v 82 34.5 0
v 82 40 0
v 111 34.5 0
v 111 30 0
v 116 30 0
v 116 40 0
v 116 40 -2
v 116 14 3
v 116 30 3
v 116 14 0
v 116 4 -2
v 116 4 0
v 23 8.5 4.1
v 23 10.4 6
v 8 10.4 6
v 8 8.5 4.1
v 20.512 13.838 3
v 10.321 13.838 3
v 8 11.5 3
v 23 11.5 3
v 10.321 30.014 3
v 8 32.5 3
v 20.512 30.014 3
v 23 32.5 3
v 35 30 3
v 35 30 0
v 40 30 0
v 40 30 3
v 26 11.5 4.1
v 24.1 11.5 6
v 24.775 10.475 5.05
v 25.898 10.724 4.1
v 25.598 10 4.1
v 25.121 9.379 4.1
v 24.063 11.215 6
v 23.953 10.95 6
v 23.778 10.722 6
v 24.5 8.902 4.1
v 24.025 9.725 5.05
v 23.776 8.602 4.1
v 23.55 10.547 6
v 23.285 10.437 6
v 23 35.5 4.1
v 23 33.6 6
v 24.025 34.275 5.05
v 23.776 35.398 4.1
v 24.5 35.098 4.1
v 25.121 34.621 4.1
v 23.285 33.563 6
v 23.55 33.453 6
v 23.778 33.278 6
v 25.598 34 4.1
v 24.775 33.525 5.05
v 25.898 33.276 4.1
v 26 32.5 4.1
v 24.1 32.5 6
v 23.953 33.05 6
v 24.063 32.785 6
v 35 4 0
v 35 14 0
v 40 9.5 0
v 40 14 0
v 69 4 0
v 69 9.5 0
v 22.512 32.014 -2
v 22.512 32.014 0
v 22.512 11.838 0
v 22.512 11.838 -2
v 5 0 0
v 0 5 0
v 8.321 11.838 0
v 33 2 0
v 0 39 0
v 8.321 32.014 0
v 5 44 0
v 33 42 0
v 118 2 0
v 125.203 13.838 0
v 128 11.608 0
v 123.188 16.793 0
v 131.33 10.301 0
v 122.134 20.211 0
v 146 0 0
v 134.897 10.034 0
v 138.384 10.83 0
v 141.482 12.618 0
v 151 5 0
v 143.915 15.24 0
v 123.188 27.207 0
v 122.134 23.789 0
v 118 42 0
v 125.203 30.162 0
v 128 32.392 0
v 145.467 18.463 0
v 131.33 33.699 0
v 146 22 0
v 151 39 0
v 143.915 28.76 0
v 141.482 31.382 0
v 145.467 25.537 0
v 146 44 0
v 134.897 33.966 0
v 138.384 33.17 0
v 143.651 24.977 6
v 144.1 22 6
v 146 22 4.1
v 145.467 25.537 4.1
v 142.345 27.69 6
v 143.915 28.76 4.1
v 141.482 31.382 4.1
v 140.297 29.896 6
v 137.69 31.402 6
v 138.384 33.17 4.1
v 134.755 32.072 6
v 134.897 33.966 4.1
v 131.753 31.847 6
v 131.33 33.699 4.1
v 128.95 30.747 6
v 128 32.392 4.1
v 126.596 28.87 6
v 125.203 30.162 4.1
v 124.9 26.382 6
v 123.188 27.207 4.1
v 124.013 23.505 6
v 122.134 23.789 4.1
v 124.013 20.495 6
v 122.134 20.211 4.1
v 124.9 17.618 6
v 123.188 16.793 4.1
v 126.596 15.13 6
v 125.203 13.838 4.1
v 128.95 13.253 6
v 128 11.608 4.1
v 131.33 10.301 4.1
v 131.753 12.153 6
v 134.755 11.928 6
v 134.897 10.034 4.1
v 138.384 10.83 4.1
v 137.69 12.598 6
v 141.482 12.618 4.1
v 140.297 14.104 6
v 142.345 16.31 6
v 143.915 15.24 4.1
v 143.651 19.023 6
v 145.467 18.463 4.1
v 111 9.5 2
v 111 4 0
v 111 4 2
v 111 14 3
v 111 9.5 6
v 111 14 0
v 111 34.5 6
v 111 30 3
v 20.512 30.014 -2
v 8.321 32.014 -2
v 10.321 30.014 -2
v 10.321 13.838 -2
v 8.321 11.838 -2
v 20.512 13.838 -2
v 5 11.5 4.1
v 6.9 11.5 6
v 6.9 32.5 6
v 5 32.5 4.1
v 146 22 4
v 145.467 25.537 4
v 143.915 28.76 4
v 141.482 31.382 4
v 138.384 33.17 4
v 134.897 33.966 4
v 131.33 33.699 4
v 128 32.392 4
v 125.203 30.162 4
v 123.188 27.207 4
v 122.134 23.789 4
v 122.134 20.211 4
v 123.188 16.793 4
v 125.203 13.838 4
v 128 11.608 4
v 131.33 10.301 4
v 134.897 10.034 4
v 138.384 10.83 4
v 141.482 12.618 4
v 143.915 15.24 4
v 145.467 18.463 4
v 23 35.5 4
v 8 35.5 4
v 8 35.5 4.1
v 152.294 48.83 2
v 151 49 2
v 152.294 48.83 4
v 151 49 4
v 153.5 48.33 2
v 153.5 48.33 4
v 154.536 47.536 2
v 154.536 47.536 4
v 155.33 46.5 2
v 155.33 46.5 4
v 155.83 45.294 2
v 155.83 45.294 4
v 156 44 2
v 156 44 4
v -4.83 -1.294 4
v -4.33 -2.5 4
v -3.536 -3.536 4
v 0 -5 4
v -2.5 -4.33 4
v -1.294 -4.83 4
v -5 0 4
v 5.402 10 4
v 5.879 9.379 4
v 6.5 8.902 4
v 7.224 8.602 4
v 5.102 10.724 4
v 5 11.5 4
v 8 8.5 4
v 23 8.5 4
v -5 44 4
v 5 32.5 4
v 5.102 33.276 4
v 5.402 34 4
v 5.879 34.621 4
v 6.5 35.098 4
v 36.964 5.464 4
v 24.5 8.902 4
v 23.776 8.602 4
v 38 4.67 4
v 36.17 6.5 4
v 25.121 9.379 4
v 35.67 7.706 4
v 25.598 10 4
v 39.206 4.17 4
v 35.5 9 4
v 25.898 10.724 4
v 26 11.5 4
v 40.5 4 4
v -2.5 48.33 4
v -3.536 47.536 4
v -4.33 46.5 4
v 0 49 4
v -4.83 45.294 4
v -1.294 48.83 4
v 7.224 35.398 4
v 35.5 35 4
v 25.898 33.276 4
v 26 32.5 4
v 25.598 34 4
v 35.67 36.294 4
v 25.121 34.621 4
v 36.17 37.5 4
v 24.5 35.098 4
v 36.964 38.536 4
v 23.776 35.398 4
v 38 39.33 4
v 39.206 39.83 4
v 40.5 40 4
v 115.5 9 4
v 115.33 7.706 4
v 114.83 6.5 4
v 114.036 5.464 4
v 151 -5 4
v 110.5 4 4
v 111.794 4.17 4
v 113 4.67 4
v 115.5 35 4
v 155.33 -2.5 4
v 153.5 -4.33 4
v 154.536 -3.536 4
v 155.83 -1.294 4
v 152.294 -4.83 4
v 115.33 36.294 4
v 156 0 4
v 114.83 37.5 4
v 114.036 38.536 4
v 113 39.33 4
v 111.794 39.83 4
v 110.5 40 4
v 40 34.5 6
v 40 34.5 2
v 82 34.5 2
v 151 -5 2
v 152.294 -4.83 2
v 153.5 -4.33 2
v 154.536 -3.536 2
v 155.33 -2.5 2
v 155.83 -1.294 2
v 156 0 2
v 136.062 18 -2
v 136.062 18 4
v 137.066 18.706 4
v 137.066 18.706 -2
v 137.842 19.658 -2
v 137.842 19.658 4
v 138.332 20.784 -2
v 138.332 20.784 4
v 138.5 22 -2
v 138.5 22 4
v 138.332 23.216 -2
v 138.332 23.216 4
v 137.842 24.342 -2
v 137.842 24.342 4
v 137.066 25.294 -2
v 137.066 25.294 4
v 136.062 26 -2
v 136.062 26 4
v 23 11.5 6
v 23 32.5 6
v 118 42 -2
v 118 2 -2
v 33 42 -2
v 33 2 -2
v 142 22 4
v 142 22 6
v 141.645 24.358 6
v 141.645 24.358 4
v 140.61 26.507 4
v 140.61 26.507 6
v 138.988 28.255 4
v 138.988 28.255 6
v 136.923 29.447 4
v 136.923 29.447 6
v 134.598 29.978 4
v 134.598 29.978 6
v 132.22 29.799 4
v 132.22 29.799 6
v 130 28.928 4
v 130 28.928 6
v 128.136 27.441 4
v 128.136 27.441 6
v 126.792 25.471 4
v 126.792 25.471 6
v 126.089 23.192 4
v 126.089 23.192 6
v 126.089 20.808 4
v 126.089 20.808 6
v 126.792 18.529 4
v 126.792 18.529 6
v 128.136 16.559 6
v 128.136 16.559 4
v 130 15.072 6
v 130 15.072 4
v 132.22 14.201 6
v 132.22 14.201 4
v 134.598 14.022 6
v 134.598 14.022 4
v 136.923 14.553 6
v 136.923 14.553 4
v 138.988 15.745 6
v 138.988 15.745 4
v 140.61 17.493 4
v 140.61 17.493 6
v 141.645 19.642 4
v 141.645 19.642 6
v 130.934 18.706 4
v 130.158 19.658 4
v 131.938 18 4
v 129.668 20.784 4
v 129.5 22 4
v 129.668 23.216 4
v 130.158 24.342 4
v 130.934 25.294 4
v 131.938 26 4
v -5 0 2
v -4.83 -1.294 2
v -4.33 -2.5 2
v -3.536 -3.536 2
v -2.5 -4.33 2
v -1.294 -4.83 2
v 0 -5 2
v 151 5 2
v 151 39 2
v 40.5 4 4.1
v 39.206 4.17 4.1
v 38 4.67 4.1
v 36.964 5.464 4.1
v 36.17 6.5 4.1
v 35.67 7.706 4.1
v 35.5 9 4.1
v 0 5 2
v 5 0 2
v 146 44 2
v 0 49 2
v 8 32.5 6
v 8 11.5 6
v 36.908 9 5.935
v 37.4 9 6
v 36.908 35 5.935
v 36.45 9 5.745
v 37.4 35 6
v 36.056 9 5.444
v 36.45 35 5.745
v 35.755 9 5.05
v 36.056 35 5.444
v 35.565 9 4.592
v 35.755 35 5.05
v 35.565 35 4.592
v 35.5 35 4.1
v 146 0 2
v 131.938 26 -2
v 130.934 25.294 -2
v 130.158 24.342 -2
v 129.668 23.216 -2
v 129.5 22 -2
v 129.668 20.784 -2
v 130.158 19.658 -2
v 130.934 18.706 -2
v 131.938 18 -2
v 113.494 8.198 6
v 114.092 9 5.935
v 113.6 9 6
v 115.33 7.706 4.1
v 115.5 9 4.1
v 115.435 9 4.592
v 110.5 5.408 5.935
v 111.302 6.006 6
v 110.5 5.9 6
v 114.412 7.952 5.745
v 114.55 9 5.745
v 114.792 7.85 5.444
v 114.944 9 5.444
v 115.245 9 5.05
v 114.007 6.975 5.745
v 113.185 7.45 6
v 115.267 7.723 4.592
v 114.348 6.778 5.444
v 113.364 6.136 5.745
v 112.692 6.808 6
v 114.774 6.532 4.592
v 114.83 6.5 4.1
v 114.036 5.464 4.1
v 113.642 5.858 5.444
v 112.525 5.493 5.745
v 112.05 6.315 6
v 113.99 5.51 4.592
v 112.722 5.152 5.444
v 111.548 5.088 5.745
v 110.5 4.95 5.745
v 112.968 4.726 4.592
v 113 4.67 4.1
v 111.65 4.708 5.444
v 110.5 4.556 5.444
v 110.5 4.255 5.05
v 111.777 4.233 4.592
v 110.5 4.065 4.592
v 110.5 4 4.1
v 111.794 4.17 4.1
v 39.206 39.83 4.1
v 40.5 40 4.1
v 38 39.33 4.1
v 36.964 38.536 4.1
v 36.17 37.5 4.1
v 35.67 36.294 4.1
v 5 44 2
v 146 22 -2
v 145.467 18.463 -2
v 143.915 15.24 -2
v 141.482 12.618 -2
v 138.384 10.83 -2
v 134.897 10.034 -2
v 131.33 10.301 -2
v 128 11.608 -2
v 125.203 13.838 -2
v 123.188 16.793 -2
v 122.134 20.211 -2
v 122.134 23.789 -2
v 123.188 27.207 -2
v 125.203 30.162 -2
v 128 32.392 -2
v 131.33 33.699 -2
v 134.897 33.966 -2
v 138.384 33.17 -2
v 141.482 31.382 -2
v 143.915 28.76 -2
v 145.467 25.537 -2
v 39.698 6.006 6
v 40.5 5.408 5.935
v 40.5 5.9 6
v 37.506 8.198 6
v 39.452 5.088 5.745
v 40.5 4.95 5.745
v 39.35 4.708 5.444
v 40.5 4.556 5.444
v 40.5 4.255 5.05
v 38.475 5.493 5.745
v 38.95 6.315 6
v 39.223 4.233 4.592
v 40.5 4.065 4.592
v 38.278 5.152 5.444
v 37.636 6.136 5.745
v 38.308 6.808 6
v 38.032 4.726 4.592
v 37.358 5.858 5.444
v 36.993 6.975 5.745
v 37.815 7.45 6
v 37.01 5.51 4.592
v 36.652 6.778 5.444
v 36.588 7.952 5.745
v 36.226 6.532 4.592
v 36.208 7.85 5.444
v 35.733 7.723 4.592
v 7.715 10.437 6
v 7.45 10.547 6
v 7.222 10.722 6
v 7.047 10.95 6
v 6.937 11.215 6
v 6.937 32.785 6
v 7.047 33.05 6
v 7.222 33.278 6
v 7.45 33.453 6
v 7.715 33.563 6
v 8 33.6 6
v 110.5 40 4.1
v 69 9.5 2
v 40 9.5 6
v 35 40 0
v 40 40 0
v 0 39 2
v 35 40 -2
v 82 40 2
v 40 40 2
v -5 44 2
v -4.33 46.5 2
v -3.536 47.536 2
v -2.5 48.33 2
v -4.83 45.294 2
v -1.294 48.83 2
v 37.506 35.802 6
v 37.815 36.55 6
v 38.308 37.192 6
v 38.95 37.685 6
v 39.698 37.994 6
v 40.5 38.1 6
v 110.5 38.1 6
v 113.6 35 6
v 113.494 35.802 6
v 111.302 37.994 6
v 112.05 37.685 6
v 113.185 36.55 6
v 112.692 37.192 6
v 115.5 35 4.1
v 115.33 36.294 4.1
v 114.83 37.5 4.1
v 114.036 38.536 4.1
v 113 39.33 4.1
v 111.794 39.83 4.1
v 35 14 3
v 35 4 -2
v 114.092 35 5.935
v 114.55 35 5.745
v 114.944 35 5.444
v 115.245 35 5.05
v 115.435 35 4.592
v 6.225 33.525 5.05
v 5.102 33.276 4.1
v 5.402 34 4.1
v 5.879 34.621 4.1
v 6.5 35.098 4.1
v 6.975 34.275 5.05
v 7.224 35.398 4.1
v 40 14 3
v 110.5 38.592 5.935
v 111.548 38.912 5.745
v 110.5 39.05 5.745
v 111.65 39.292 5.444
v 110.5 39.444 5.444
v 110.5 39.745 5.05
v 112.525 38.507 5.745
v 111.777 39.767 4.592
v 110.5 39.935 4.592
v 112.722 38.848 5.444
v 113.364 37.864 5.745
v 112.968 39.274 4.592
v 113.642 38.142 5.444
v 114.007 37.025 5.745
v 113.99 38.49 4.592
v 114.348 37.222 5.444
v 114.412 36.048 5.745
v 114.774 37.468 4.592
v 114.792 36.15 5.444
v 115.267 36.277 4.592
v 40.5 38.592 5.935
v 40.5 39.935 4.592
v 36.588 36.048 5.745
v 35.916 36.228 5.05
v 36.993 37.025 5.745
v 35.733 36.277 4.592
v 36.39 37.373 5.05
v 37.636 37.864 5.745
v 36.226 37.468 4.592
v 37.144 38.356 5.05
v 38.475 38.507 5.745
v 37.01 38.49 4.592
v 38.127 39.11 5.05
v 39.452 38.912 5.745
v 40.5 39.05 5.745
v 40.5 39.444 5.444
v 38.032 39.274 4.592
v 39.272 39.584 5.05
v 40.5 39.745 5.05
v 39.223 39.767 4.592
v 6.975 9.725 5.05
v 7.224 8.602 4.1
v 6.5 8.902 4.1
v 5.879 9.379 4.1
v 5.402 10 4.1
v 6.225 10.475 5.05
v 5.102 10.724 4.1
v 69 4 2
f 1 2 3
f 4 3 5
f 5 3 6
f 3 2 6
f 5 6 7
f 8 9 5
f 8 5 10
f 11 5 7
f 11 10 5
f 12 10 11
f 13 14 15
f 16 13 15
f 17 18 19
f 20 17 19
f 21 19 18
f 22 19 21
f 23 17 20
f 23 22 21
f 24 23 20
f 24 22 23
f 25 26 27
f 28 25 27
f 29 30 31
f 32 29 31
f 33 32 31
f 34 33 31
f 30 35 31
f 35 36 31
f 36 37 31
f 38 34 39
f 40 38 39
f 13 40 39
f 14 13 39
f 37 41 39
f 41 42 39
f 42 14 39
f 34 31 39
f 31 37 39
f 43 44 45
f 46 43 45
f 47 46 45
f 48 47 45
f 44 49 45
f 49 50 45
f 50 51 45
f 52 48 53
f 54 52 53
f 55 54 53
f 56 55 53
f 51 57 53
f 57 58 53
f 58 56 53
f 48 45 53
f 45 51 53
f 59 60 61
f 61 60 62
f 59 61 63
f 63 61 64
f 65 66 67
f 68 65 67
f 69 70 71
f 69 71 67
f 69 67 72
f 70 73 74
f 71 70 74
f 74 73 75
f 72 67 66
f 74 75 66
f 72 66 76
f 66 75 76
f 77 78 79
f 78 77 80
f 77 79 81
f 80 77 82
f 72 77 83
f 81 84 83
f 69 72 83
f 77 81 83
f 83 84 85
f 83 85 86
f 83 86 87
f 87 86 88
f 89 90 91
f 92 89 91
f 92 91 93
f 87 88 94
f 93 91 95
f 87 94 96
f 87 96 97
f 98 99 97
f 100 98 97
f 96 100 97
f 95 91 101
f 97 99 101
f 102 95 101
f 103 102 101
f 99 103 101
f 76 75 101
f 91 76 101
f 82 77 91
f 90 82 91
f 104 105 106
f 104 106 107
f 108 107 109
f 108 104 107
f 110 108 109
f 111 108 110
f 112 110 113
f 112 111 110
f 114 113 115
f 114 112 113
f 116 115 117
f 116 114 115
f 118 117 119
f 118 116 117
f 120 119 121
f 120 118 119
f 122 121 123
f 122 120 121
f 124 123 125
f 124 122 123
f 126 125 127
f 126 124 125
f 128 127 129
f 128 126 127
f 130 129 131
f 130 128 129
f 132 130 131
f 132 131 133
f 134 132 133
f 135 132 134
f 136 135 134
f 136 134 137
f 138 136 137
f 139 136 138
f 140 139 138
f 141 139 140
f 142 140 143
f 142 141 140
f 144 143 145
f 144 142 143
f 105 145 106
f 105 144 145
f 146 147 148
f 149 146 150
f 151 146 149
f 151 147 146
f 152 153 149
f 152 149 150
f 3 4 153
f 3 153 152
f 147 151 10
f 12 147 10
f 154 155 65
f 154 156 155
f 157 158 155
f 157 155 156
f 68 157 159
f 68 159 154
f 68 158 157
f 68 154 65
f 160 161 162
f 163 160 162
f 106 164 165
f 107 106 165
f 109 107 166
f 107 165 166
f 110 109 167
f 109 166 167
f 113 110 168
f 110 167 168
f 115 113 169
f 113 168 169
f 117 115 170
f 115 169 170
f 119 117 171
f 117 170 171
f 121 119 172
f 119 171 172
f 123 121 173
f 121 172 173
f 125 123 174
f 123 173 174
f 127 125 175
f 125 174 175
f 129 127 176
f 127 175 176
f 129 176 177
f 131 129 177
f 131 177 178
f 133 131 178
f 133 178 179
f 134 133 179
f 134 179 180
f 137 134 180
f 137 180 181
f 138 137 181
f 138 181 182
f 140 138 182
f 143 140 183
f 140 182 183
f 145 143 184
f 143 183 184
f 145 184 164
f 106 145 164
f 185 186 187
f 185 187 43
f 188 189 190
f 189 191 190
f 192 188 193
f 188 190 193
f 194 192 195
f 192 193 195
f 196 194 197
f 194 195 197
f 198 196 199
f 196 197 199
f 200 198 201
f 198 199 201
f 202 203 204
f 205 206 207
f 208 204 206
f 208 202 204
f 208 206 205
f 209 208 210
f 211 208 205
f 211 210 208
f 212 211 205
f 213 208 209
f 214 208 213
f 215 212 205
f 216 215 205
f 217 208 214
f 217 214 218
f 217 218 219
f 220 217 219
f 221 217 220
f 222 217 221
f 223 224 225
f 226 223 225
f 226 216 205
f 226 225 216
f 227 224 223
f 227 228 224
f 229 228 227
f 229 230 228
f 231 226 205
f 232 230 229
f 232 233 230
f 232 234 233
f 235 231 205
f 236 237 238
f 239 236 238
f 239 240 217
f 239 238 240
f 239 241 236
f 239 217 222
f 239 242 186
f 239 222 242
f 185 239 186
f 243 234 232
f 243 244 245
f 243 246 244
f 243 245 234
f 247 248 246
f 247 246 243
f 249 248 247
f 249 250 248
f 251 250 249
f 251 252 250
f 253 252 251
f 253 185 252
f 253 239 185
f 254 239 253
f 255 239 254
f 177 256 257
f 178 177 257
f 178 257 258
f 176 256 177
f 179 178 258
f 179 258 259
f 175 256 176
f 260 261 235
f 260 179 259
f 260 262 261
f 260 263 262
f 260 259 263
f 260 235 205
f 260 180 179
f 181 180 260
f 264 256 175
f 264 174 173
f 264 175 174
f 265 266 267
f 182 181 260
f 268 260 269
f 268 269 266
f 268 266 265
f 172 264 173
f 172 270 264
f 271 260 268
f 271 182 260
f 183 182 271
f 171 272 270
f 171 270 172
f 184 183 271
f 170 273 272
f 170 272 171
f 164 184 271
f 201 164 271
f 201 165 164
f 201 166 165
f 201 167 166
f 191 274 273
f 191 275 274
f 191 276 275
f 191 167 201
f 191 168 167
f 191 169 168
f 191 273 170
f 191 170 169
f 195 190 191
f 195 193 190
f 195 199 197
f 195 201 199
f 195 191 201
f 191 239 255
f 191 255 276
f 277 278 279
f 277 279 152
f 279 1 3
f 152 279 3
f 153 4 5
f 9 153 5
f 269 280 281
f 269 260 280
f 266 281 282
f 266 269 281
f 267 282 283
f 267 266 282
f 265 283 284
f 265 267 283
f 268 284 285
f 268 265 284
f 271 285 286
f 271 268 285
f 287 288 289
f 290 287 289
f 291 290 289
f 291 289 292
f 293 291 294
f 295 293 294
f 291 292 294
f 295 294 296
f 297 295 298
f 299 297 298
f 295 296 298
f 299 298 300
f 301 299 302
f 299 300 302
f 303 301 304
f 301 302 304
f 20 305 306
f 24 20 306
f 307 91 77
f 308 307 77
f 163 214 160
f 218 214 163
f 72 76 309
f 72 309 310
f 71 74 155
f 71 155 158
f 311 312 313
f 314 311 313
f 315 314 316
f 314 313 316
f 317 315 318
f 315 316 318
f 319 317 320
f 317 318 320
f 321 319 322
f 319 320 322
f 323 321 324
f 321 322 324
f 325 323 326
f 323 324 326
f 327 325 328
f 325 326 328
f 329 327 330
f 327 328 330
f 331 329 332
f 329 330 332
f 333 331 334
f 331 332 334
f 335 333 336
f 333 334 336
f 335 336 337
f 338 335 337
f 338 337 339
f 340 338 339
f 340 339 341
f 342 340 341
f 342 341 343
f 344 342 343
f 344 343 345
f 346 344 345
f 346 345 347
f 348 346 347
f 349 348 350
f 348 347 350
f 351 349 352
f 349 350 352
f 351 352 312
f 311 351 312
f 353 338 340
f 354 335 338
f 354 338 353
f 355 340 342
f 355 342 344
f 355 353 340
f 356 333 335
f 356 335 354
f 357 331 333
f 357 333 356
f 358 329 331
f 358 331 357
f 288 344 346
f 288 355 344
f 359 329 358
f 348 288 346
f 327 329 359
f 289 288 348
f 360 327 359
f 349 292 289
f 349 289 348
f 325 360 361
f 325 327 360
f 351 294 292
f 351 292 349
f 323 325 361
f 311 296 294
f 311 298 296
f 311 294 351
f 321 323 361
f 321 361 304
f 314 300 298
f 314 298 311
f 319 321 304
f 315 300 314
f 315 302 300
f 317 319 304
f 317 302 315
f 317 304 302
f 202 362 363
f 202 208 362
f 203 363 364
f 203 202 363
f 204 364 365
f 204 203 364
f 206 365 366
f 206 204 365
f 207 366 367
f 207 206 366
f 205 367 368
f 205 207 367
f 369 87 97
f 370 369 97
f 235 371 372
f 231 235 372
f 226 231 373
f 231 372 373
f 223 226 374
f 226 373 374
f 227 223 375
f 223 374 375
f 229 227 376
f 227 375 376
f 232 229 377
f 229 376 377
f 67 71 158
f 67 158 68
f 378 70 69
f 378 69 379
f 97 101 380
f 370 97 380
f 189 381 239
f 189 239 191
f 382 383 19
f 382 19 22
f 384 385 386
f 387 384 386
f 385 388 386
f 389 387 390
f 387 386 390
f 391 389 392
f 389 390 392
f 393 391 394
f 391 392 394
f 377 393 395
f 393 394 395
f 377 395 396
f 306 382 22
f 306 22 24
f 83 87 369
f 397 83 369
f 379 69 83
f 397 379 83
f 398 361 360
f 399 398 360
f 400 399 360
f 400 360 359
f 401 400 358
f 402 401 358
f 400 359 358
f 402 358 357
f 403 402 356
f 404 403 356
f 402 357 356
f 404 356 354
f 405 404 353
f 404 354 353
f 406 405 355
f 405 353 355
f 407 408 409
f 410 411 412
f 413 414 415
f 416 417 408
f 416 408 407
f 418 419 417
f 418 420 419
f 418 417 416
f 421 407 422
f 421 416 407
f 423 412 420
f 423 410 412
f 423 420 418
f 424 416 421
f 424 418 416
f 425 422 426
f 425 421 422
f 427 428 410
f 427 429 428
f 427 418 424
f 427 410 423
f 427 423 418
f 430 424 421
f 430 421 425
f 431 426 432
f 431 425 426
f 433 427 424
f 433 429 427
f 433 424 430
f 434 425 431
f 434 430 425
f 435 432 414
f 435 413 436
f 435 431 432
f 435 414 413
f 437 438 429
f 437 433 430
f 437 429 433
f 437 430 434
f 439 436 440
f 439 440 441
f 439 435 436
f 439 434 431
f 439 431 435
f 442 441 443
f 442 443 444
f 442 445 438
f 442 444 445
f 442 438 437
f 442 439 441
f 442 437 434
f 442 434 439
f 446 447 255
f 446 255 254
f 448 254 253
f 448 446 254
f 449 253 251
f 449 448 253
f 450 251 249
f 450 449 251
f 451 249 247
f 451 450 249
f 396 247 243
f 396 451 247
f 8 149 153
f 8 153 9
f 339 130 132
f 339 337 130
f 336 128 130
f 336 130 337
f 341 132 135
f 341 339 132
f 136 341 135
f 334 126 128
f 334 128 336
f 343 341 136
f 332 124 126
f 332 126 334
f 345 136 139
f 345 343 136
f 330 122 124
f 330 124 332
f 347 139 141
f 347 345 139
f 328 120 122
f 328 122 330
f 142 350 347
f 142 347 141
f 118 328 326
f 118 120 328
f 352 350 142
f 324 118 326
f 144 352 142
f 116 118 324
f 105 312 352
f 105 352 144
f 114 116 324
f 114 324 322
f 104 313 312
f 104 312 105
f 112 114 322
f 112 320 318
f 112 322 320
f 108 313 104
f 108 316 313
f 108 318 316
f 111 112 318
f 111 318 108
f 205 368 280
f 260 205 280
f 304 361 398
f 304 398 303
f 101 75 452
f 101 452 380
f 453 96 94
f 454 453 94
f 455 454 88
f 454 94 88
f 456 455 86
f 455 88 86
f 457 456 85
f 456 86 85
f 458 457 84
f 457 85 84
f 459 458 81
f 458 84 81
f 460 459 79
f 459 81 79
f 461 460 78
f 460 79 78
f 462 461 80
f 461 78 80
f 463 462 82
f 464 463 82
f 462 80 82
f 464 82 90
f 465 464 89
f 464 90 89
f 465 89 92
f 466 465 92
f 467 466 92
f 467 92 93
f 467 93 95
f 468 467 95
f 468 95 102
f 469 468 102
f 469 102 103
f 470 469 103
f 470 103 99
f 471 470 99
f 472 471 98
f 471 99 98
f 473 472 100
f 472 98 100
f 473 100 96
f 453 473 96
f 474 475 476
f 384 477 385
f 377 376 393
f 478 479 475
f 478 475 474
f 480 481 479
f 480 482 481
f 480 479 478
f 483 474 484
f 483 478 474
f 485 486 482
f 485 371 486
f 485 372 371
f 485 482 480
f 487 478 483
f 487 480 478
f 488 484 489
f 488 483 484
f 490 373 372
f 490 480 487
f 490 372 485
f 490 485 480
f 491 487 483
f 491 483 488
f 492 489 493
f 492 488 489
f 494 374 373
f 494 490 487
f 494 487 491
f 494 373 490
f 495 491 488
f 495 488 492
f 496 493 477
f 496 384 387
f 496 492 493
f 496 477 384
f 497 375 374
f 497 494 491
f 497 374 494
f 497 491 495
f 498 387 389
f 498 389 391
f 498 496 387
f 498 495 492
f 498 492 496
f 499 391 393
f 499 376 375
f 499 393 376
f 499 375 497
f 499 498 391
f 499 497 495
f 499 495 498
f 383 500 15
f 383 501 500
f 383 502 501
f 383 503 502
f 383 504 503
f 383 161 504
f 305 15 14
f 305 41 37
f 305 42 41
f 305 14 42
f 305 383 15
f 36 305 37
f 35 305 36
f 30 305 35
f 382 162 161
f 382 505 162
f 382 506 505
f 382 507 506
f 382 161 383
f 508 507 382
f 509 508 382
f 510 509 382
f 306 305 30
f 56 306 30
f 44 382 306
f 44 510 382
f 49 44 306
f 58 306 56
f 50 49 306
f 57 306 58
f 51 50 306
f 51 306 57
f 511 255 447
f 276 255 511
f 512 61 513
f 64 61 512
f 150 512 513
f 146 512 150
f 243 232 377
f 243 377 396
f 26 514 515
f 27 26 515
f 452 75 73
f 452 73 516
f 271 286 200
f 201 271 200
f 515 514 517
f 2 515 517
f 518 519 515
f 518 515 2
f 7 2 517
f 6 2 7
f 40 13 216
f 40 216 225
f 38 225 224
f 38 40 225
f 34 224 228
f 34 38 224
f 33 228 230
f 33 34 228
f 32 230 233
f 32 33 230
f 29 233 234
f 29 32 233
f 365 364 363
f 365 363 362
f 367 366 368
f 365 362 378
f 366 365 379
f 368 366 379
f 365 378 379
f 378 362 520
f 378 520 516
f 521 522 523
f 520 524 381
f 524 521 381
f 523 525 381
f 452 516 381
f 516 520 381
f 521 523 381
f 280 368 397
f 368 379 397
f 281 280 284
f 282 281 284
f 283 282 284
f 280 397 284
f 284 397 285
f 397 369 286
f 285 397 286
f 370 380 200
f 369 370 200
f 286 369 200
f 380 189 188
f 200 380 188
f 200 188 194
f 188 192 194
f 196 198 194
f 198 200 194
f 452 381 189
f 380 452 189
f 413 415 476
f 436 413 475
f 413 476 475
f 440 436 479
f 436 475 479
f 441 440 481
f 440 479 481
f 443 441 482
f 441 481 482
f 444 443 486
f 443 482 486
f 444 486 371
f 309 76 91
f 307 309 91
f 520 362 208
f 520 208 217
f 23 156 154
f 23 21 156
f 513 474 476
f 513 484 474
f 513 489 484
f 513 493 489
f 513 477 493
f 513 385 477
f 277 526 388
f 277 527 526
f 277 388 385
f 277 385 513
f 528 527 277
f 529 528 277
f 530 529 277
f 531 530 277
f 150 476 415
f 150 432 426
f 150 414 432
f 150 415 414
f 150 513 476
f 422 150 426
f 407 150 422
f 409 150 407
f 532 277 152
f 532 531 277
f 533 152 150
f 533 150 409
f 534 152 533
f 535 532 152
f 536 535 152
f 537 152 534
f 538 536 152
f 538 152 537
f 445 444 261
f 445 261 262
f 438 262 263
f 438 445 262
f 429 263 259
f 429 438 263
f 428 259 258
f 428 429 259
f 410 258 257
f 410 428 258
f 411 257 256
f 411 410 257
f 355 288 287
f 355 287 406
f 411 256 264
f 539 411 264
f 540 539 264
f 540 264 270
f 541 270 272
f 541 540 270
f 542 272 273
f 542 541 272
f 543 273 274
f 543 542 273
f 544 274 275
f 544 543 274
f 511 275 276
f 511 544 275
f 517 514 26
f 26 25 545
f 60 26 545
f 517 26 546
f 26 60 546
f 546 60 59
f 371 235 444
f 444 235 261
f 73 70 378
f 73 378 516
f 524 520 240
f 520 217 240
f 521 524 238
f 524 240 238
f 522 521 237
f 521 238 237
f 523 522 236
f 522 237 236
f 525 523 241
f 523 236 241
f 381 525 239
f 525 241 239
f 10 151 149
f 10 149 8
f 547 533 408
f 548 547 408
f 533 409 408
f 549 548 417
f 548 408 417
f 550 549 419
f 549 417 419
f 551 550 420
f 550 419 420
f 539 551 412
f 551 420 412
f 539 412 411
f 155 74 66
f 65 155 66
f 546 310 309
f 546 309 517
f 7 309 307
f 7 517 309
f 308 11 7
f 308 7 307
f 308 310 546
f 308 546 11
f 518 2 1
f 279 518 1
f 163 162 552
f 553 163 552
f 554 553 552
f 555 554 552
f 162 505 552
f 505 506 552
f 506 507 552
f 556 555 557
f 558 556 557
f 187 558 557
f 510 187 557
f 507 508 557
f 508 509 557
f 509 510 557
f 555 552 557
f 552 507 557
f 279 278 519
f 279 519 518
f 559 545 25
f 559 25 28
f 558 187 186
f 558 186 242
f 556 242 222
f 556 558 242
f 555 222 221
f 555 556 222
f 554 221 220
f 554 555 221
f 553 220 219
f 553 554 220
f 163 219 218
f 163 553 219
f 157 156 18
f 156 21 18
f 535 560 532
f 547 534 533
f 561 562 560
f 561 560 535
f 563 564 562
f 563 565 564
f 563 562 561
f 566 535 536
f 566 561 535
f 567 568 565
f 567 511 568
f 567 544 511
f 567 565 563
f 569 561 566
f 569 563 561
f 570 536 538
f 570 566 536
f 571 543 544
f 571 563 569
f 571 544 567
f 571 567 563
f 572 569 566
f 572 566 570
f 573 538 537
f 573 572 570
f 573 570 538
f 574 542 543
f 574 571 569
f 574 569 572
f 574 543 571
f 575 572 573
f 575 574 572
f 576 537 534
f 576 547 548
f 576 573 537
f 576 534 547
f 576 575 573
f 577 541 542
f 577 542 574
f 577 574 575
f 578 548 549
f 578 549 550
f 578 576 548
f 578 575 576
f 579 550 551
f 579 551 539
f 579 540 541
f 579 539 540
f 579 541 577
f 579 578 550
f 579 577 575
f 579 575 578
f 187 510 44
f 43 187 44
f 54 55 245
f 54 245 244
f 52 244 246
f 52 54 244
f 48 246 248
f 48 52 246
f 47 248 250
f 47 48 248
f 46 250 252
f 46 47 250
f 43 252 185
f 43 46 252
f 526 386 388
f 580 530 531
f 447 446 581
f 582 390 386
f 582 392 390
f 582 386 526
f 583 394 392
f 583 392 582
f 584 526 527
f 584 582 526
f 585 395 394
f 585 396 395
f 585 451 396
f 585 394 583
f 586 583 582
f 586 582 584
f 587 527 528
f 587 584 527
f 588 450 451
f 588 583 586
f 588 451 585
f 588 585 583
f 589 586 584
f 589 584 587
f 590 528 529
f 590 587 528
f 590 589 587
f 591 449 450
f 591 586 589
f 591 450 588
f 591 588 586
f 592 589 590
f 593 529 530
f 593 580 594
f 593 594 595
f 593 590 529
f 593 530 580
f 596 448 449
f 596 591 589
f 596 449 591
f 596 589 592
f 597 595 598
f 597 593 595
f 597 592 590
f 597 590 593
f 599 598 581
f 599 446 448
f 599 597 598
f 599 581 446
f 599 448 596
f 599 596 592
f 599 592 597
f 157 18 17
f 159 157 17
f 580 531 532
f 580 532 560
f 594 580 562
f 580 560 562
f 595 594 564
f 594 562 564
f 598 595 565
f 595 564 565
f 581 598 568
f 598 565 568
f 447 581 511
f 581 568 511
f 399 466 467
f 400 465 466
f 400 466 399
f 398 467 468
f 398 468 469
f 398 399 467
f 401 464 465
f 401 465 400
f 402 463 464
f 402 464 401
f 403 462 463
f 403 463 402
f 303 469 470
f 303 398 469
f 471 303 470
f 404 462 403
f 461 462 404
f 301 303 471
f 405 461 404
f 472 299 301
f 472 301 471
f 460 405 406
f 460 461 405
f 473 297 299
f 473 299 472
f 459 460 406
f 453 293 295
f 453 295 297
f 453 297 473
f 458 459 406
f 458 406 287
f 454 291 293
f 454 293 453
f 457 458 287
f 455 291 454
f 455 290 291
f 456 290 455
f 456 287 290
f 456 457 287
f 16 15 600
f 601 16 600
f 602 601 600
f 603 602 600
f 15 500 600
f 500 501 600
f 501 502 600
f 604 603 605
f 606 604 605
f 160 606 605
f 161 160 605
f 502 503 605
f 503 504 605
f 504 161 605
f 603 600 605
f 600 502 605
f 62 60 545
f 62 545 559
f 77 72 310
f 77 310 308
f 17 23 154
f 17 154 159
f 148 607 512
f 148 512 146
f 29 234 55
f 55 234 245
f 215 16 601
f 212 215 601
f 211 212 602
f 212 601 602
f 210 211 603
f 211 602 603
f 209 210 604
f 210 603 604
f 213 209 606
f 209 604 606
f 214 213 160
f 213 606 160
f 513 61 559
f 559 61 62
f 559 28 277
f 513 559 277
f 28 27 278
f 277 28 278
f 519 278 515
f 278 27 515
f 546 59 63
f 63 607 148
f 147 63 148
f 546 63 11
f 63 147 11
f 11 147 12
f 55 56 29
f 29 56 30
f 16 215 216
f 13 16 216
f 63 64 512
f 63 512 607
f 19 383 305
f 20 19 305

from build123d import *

# Parameters (mm, degrees)
SKETCH_W        = 151
SKETCH_H        = 44
PAD_DEPTH       = 2
SKETCH001_W     = 161
SKETCH001_H     = 54
PAD001_DEPTH    = 2
SKETCH002_W     = 21
SKETCH002_H     = 27
PAD002_DEPTH    = 2
SKETCH003_W     = 15
SKETCH003_H     = 21
POCKET_DEPTH    = 3
SKETCH004_W     = 10.191287
SKETCH004_H     = 16.176647
POCKET001_DEPTH = 3.001
CHAMFER_SIZE    = 5
FILLET_R        = 5
FILLET001_R     = 3
CHAMFER001_SIZE = 1.9
SKETCH005_R     = 12
PAD003_DEPTH    = 2
SKETCH006_R     = 8
POCKET002_DEPTH = 2
CHAMFER002_SIZE = 1.9
SKETCH007_R     = 12
PAD004_DEPTH    = 2
POCKET003_DEPTH = 6.001
SKETCH009_W     = 80
SKETCH009_H     = 36
SKETCH009_W_2   = 71
SKETCH009_H_2   = 25
PAD005_DEPTH    = 2
FILLET002_R     = 5
SKETCH010_W     = 71
SKETCH010_H     = 25
POCKET004_DEPTH = 6.001
FILLET003_R     = 1.9
SKETCH011_W     = 85
SKETCH011_H     = 40
SKETCH011_W_2   = 81
SKETCH011_H_2   = 36
PAD006_DEPTH    = 2
SKETCH012_W     = 42
SKETCH012_H     = 5.5
POCKET005_DEPTH = 2
SKETCH013_W     = 5
SKETCH013_H     = 16
POCKET006_DEPTH = 3
SKETCH014_W     = 14.191287
SKETCH014_H     = 20.176647
SKETCH014_W_2   = 10.191287
SKETCH014_H_2   = 16.176647
PAD007_DEPTH    = 2


with BuildPart() as part:
    # Sketch → Pad (new body)
    with BuildSketch(Plane.XY):
        with Locations((75.5, 22)):
            Rectangle(SKETCH_W, SKETCH_H)
    extrude(amount=PAD_DEPTH)

    # Sketch001 (on Face6 of Pad) → Pad001 (join)
    with BuildSketch(Plane.XY.offset(2)):
        with Locations((75.5, 22)):
            Rectangle(SKETCH001_W, SKETCH001_H)
    extrude(amount=PAD001_DEPTH)

    # Sketch002 (on Face11 of Pad001) → Pad002 (join)
    with BuildSketch(Plane.XY.offset(4)):
        with Locations((15.5, 22)):
            Rectangle(SKETCH002_W, SKETCH002_H)
    extrude(amount=PAD002_DEPTH)

    # Sketch003 (on Face16 of Pad002) → Pocket (cut)
    with BuildSketch(Plane.XY.offset(6)):
        with Locations((15.5, 22)):
            Rectangle(SKETCH003_W, SKETCH003_H)
    extrude(amount=-POCKET_DEPTH, mode=Mode.SUBTRACT)

    # Sketch004 (on Face21 of Pocket) → Pocket001 (cut, through all)
    with BuildSketch(Plane.XY.offset(3)):
        with Locations((15.416752, 21.925829)):
            Rectangle(SKETCH004_W, SKETCH004_H)
    extrude(amount=-POCKET001_DEPTH, mode=Mode.SUBTRACT)

    # Chamfer
    chamfer_edges = [part.edges().sort_by_distance(p)[0] for p in [
        (151, 0, 1),
        (151, 44, 1),
        (0, 44, 1),
        (0, 0, 1),
    ]]
    chamfer(chamfer_edges, length=CHAMFER_SIZE)

    # Fillet
    fillet_edges = [part.edges().sort_by_distance(p)[0] for p in [
        (-5, -5, 3),
        (-5, 49, 3),
        (156, -5, 3),
        (156, 49, 3),
    ]]
    fillet(fillet_edges, radius=FILLET_R)

    # Fillet001
    fillet001_edges = [part.edges().sort_by_distance(p)[0] for p in [
        (26, 8.5, 5),
        (26, 35.5, 5),
        (5, 8.5, 5),
        (5, 35.5, 5),
    ]]
    fillet(fillet001_edges, radius=FILLET001_R)

    # Chamfer001
    chamfer001_edges = [part.edges().sort_by_distance(p)[0] for p in [
        (5, 22, 6),
    ]]
    chamfer(chamfer001_edges, length=CHAMFER001_SIZE)

    # Sketch005 (on Face4 of Chamfer001) → Pad003 (join)
    with BuildSketch(Plane.XY.offset(4)):
        with Locations((134, 22)):
            Circle(SKETCH005_R)
    extrude(amount=PAD003_DEPTH)

    # Sketch006 (on Face33 of Pad003) → Pocket002 (cut)
    with BuildSketch(Plane.XY.offset(6)):
        with Locations((134, 22)):
            Circle(SKETCH006_R)
    extrude(amount=-POCKET002_DEPTH, mode=Mode.SUBTRACT)

    # Chamfer002
    chamfer002_edges = [part.edges().sort_by_distance(p)[0] for p in [
        (122, 22, 6),
    ]]
    chamfer(chamfer002_edges, length=CHAMFER002_SIZE)

    # Sketch007 (on Face41 of Chamfer002) → Pad004 (join)
    with BuildSketch(Plane(origin=(0, 0, 0), x_dir=(1, 0, 0), z_dir=(0, 0, -1))):
        with Locations((134, -22)):
            Circle(SKETCH007_R)
    extrude(amount=PAD004_DEPTH)

    # Sketch008 (on Face31 of Pad004) → Pocket003 (cut, through all)
    with BuildSketch(Plane.XY.offset(4)):
        with BuildLine():
            ThreePointArc((131.938447, 26), (129.5, 22), (131.938447, 18))
            Line((136.061553, 18), (131.938447, 18))
            ThreePointArc((136.061553, 18), (138.5, 22), (136.061553, 26))
            Line((131.938447, 26), (136.061553, 26))
        make_face()
    extrude(amount=-POCKET003_DEPTH, mode=Mode.SUBTRACT)

    # Sketch009 (on Face3 of Pocket003) → Pad005 (join)
    with BuildSketch(Plane.XY.offset(4)):
        with Locations((75.5, 22)):
            Rectangle(SKETCH009_W, SKETCH009_H)
        with Locations((75.5, 22)):
            Rectangle(SKETCH009_W_2, SKETCH009_H_2, mode=Mode.SUBTRACT)
    extrude(amount=PAD005_DEPTH)

    # Fillet002
    fillet002_edges = [part.edges().sort_by_distance(p)[0] for p in [
        (115.5, 4, 5),
        (115.5, 40, 5),
        (35.5, 4, 5),
        (35.5, 40, 5),
    ]]
    fillet(fillet002_edges, radius=FILLET002_R)

    # Sketch010 (on Face52 of Fillet002) → Pocket004 (cut, through all)
    with BuildSketch(Plane.XY.offset(4)):
        with Locations((75.5, 22)):
            Rectangle(SKETCH010_W, SKETCH010_H)
    extrude(amount=-POCKET004_DEPTH, mode=Mode.SUBTRACT)

    # Fillet003
    fillet003_edges = [part.edges().sort_by_distance(p)[0] for p in [
        (75.5, 40, 6),
    ]]
    fillet(fillet003_edges, radius=FILLET003_R)

    # Sketch011 (on Face64 of Fillet003) → Pad006 (join)
    with BuildSketch(Plane(origin=(0, 0, 0), x_dir=(1, 0, 0), z_dir=(0, 0, -1))):
        with Locations((75.5, -22)):
            Rectangle(SKETCH011_W, SKETCH011_H)
        with Locations((75.5, -22)):
            Rectangle(SKETCH011_W_2, SKETCH011_H_2, mode=Mode.SUBTRACT)
    extrude(amount=PAD006_DEPTH)

    # Sketch012 (on Face64 of Pad006) → Pocket005 (cut)
    with BuildSketch(Plane(origin=(0, 0, 0), x_dir=(1, 0, 0), z_dir=(0, 0, -1))):
        with Locations((90, -6.75)):
            Rectangle(SKETCH012_W, SKETCH012_H)
        with Locations((61, -37.25)):
            Rectangle(SKETCH012_W, SKETCH012_H)
    extrude(amount=-POCKET005_DEPTH, mode=Mode.SUBTRACT)

    # Sketch013 (on Face68 of Pocket005) → Pocket006 (cut)
    with BuildSketch(Plane(origin=(0, 0, 0), x_dir=(1, 0, 0), z_dir=(0, 0, -1))):
        with Locations((37.5, -22)):
            Rectangle(SKETCH013_W, SKETCH013_H)
        with Locations((113.5, -22)):
            Rectangle(SKETCH013_W, SKETCH013_H)
    extrude(amount=-POCKET006_DEPTH, mode=Mode.SUBTRACT)

    # Sketch014 (on Face80 of Pocket006) → Pad007 (join)
    with BuildSketch(Plane(origin=(0, 0, 0), x_dir=(1, 0, 0), z_dir=(0, 0, -1))):
        with Locations((15.416752, -21.925829)):
            Rectangle(SKETCH014_W, SKETCH014_H)
        with Locations((15.416752, -21.925829)):
            Rectangle(SKETCH014_W_2, SKETCH014_H_2, mode=Mode.SUBTRACT)
    extrude(amount=PAD007_DEPTH)


solid = part.part
